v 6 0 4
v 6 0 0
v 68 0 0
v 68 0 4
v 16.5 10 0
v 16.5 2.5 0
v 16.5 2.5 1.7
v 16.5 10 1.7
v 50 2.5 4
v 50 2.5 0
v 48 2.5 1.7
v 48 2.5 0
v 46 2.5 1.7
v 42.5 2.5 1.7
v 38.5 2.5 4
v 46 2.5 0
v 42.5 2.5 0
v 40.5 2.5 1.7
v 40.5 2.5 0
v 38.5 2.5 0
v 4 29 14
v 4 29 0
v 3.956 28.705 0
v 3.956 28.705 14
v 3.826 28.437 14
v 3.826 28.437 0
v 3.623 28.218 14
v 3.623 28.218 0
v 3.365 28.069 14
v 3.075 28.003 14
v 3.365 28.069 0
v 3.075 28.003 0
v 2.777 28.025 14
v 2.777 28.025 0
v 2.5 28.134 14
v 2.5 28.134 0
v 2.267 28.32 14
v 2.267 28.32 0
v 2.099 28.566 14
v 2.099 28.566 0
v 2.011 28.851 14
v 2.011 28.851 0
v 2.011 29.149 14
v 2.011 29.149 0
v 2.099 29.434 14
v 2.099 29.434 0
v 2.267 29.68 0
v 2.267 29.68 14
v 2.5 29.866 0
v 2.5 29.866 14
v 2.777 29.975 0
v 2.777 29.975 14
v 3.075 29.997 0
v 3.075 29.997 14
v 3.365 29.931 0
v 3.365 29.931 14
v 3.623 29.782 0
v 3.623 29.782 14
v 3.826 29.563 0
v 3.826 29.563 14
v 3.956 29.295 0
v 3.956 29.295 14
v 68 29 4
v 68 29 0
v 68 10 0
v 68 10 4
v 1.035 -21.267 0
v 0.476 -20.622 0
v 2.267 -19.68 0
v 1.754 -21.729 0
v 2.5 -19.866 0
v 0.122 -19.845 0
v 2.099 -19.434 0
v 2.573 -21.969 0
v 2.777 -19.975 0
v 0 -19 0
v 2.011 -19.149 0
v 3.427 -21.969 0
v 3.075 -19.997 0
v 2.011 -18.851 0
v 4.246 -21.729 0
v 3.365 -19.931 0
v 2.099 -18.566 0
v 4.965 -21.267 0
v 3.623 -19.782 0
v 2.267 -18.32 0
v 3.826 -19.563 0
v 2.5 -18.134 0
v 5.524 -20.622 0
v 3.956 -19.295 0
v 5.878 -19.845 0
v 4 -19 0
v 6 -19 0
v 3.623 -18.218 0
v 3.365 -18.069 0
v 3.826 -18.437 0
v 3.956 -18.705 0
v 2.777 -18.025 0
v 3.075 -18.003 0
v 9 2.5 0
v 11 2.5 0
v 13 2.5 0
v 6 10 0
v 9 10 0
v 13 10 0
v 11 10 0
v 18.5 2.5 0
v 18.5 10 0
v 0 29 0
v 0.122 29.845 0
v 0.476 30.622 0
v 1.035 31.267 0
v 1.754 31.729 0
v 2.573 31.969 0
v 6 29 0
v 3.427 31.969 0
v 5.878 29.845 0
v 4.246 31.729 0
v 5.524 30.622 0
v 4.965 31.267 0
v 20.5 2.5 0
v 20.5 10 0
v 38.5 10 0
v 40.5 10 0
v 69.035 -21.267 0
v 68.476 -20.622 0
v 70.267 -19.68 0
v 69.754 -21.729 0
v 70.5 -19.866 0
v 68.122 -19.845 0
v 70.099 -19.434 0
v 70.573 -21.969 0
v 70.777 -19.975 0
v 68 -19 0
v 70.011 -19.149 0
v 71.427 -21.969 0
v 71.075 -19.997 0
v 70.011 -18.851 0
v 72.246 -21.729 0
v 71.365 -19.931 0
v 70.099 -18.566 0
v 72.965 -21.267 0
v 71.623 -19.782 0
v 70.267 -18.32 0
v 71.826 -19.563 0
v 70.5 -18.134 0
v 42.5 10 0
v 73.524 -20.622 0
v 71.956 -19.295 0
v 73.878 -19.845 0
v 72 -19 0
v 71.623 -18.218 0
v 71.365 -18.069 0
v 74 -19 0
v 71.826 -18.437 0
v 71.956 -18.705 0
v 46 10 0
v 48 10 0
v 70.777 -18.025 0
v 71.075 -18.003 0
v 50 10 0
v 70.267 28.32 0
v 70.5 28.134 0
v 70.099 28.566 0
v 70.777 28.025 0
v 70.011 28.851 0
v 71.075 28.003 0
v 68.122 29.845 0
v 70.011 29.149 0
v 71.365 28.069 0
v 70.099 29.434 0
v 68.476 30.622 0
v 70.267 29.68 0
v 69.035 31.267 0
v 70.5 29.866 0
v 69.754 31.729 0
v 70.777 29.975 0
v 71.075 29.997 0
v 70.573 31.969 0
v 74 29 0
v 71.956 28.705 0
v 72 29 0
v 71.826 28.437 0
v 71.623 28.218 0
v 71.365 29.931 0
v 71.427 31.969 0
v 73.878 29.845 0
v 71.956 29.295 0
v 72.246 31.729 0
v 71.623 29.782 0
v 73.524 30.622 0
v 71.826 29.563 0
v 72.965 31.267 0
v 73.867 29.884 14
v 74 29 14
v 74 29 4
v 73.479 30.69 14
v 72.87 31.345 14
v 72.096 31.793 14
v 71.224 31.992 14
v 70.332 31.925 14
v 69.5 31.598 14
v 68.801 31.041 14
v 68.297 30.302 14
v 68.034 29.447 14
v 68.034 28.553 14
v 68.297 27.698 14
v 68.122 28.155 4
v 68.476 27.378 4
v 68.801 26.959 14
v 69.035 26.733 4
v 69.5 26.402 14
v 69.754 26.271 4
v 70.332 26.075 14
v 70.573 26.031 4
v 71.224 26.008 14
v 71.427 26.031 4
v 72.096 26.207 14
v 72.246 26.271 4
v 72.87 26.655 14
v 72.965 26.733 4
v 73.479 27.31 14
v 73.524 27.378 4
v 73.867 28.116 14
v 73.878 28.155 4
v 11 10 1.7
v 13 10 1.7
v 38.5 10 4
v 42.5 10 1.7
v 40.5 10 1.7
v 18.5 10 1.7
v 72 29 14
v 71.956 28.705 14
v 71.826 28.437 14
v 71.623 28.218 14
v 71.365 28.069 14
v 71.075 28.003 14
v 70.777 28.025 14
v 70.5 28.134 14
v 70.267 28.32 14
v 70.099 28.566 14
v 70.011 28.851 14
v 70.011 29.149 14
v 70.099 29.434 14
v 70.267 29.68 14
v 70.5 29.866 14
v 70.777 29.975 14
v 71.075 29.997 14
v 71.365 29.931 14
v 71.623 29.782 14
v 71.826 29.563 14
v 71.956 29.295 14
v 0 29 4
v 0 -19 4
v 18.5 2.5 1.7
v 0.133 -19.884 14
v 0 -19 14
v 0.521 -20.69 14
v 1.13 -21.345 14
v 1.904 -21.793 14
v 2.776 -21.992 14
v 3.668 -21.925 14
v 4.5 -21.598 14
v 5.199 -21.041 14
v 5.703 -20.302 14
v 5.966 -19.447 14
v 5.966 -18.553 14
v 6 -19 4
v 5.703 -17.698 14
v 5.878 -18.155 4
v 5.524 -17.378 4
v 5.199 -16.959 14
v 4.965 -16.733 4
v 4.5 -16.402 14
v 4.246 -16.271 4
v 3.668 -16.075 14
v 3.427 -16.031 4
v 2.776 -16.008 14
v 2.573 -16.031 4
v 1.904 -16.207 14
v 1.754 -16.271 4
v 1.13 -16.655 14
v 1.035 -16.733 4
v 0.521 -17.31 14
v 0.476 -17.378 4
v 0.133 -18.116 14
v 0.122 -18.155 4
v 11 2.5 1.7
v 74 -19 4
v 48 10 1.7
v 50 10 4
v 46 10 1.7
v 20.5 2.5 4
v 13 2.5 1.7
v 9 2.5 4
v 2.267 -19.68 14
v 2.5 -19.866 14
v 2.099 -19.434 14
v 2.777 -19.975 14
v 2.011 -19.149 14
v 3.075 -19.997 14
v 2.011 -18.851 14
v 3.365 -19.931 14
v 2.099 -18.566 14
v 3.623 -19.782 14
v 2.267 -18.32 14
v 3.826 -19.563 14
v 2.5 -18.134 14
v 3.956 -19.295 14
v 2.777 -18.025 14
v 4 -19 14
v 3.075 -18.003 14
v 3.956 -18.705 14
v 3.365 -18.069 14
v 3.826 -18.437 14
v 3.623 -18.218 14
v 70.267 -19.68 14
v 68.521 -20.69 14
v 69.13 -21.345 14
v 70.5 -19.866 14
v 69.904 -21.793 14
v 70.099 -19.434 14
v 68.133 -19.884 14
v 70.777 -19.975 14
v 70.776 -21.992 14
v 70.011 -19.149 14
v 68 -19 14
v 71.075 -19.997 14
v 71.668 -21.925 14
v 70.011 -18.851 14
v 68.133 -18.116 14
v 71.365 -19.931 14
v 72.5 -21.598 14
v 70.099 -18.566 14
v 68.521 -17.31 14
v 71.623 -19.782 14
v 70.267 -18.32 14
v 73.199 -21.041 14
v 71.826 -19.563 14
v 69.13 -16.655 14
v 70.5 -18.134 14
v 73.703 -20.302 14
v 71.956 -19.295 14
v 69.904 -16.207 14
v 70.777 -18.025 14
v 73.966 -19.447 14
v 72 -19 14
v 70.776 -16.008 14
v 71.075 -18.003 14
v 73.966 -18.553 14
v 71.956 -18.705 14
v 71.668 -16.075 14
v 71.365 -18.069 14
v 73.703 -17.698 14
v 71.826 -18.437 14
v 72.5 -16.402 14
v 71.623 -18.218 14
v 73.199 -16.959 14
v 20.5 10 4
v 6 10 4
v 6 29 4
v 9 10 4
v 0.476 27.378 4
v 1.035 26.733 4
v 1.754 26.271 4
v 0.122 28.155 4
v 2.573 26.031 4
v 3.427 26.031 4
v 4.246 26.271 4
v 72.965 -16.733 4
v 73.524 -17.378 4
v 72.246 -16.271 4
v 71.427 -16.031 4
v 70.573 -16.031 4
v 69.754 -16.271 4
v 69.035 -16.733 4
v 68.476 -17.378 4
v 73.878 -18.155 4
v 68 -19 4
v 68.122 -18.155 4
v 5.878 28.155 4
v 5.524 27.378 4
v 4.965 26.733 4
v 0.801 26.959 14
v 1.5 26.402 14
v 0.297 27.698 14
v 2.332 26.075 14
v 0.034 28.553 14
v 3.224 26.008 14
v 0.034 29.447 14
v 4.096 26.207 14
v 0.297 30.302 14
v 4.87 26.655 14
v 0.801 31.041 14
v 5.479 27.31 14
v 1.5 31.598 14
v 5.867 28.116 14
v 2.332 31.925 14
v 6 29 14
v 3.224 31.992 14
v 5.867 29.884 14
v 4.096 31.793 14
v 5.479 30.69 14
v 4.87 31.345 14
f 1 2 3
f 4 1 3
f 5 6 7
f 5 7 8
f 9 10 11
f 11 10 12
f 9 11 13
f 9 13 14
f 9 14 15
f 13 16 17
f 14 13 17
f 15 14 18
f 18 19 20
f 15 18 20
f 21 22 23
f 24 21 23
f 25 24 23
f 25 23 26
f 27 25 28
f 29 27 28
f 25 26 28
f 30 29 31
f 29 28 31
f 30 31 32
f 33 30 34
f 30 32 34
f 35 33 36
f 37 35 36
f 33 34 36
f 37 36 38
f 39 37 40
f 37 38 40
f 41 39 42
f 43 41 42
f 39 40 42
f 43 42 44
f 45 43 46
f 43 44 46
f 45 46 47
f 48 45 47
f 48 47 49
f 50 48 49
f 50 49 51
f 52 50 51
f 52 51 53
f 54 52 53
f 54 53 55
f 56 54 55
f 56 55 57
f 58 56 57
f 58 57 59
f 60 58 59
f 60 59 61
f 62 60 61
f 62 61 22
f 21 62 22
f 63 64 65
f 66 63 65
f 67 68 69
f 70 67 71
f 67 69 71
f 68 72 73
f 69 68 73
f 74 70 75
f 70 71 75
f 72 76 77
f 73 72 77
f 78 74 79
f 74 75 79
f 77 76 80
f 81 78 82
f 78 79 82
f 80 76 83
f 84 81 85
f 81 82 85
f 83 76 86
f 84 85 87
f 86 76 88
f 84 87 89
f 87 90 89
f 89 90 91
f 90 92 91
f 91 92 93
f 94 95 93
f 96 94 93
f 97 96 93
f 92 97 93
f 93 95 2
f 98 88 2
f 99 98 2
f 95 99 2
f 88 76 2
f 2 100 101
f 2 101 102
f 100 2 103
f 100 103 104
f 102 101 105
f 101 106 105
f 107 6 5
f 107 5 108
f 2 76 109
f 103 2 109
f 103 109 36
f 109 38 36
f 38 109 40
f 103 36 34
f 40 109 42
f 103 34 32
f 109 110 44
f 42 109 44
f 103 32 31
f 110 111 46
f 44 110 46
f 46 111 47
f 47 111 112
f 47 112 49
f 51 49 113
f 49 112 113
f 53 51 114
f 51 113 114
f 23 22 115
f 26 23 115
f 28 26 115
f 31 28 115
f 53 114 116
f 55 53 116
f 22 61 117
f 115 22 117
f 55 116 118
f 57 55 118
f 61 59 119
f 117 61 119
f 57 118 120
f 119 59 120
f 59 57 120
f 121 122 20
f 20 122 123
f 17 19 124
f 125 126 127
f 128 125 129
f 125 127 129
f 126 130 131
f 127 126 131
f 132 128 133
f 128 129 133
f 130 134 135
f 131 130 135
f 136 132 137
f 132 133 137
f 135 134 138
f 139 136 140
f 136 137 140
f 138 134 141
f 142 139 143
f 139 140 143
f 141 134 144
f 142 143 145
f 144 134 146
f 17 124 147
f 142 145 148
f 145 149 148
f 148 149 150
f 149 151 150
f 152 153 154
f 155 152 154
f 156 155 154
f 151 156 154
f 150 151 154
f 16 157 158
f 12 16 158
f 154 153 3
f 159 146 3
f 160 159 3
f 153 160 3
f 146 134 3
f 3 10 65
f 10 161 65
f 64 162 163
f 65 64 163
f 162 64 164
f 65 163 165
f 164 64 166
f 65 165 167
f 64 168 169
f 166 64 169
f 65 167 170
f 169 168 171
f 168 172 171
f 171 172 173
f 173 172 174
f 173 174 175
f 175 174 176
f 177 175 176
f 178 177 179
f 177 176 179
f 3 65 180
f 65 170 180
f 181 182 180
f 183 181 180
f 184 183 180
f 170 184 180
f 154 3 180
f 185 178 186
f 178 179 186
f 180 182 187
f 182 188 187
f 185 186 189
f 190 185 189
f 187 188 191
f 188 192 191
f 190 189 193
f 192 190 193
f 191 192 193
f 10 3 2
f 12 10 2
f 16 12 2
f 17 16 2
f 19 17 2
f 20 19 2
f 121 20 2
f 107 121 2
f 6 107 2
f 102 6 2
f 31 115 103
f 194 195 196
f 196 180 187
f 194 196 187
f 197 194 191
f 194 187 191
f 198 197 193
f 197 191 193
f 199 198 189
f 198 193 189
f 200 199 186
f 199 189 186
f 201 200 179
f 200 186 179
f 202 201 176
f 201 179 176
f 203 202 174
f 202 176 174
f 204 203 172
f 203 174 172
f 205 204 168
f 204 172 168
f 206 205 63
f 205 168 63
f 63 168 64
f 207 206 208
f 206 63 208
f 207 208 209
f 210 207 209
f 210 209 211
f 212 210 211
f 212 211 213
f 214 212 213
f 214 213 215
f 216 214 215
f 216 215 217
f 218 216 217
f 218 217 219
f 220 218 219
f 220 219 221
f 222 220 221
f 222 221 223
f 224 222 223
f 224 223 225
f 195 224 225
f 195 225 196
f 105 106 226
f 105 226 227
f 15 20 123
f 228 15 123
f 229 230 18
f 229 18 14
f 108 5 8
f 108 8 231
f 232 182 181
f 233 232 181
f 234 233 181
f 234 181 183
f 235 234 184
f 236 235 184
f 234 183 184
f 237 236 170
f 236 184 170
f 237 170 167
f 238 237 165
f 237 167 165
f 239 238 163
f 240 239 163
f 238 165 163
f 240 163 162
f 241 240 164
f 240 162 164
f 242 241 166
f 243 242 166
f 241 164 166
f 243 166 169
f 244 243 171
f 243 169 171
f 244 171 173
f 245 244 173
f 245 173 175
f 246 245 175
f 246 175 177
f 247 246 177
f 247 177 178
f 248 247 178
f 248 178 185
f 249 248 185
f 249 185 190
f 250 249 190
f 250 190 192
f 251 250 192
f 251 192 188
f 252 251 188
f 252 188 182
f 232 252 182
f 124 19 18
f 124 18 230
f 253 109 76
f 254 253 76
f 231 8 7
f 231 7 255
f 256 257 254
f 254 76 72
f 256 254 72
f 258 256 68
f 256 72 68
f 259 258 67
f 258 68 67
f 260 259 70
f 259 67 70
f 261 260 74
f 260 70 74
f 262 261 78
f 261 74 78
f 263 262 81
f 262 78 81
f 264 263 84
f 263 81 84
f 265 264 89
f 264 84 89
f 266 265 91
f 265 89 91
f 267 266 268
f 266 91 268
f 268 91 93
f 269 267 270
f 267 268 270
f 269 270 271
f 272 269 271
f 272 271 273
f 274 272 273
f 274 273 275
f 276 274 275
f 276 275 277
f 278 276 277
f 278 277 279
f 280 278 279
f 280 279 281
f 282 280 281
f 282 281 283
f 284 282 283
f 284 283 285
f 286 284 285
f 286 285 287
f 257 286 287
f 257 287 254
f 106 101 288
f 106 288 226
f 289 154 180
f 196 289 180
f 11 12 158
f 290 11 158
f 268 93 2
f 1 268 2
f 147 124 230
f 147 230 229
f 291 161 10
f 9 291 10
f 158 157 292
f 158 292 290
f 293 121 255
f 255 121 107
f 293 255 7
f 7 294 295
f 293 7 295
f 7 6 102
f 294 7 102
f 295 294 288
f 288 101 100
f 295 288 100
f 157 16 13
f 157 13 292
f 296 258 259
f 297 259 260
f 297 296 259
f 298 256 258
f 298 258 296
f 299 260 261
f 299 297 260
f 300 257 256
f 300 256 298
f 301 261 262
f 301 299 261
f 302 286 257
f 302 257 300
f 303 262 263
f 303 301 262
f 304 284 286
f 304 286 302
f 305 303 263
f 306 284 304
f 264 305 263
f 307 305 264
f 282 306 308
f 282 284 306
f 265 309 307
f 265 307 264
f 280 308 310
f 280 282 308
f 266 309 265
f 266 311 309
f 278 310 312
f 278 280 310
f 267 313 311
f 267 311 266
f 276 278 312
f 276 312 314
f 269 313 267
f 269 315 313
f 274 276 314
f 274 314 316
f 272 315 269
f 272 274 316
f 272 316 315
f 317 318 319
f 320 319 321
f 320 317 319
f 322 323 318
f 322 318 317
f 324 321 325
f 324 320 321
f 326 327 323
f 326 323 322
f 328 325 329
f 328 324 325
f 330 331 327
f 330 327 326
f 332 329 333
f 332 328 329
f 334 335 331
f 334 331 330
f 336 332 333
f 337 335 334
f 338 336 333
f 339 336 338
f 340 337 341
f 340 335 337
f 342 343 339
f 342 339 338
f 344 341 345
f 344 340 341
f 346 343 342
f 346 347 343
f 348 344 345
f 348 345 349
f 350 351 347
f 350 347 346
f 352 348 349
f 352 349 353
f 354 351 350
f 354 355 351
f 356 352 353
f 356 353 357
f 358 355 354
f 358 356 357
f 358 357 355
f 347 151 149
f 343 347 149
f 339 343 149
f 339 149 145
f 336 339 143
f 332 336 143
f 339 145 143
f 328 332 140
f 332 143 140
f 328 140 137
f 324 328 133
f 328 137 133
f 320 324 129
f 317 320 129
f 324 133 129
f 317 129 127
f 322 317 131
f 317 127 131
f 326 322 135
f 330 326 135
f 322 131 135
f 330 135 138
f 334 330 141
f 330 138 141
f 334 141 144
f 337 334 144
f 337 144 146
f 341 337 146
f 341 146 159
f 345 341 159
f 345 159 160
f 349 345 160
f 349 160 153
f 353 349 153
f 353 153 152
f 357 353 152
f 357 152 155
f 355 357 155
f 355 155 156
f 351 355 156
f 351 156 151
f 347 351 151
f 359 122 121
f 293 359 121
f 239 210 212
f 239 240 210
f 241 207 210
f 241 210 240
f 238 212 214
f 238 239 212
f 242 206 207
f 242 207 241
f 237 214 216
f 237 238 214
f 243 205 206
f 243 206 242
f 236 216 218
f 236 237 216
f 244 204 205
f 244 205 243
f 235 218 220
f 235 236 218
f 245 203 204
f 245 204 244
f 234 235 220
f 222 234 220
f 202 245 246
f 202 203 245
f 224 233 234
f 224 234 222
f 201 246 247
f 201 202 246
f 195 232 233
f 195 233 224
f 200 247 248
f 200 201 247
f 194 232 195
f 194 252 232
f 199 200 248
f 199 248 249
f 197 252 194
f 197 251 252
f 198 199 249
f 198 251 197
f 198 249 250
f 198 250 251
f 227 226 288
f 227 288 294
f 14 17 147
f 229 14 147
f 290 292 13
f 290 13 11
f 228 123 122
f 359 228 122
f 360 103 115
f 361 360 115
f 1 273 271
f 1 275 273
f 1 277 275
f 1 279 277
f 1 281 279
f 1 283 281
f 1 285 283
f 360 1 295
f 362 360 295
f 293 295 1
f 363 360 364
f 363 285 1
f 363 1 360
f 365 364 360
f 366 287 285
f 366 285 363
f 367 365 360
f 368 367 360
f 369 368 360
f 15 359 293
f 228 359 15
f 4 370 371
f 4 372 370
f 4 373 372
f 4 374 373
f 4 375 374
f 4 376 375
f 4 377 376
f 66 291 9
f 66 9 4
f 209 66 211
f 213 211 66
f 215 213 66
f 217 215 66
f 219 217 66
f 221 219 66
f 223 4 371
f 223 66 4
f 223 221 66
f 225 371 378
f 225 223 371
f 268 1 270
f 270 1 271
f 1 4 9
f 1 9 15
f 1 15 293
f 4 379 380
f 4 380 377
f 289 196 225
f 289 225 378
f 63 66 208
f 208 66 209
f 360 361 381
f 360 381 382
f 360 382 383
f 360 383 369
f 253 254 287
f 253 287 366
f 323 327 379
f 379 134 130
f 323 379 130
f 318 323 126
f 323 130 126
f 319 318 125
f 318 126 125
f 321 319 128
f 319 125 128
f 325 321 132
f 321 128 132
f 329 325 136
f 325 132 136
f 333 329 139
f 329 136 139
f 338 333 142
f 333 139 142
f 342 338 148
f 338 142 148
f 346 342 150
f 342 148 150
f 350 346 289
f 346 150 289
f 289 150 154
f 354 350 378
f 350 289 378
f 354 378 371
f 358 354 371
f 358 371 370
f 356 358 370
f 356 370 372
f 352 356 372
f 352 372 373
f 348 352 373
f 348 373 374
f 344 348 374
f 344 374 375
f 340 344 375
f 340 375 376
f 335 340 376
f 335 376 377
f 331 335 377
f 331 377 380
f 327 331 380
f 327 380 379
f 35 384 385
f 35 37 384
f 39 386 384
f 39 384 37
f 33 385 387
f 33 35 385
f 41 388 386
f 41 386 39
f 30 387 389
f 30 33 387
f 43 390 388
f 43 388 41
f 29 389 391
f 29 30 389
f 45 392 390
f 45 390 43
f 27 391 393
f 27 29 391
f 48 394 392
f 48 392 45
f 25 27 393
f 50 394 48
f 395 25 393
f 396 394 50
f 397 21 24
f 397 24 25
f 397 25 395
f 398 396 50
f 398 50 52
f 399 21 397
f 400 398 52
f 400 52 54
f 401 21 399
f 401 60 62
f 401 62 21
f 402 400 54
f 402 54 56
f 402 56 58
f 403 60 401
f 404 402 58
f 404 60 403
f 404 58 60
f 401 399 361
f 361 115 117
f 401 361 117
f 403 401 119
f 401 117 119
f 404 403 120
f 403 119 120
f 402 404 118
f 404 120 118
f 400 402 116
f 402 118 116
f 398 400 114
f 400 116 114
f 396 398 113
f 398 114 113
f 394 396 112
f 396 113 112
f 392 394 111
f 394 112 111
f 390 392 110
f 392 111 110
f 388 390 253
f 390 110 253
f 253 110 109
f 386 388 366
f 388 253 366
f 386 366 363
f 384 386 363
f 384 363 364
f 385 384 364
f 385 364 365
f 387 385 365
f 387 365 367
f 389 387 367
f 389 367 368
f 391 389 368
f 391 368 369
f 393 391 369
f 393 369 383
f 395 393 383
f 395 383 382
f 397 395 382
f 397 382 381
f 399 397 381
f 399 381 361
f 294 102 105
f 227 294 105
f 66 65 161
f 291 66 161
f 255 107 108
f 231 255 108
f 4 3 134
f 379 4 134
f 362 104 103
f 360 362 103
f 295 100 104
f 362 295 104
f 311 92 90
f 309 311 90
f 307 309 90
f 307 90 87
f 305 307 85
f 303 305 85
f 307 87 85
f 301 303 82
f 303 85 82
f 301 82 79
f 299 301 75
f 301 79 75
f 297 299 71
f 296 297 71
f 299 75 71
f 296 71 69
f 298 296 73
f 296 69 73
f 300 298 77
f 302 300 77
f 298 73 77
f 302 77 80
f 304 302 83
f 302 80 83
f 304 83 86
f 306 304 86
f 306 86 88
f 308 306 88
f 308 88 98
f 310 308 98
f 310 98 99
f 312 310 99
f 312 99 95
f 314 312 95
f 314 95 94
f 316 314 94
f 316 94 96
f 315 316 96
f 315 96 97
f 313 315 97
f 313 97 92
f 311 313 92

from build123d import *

# Parameters (mm, degrees)
F1_DEPTH = 4
F2_W     = 2
F2_H     = 7.5
F3_DEPTH = 1.7
F5_DEPTH = 10
F6_R     = 1
F7_DEPTH = 25


with BuildPart() as f1:
    # F0 (on Top) → F1 (new body)
    with BuildSketch(Plane.XY):
        with BuildLine():
            Line((6, 0), (68, 0))
            Line((68, 0), (68, -19))
            ThreePointArc((68, -19), (71, -22), (74, -19))
            Line((74, -19), (74, 29))
            ThreePointArc((74, 29), (71, 32), (68, 29))
            Line((68, 29), (68, 10))
            Line((68, 10), (50, 10))
            Line((50, 10), (50, 2.5))
            Line((50, 2.5), (38.5, 2.5))
            Line((38.5, 2.5), (38.5, 10))
            Line((38.5, 10), (20.5, 10))
            Line((20.5, 10), (20.5, 2.5))
            Line((20.5, 2.5), (9, 2.5))
            Line((9, 2.5), (9, 10))
            Line((9, 10), (6, 10))
            Line((6, 10), (6, 29))
            ThreePointArc((6, 29), (3, 32), (0, 29))
            Line((0, 29), (0, -19))
            ThreePointArc((0, -19), (3, -22), (6, -19))
            Line((6, -19), (6, 0))
        make_face()
    extrude(amount=F1_DEPTH)

    # F2 (on Top) → F3 (join)
    with BuildSketch(Plane.XY):
        with Locations((12, 6.25)):
            Rectangle(F2_W, F2_H)
        with Locations((17.5, 6.25)):
            Rectangle(F2_W, F2_H)
        with Locations((41.5, 6.25)):
            Rectangle(F2_W, F2_H)
        with Locations((47, 6.25)):
            Rectangle(F2_W, F2_H)
    extrude(amount=F3_DEPTH)

    # F4 (on face) → F5 (join)
    with BuildSketch(Plane.XY.offset(4)):
        with BuildLine():
            ThreePointArc((0, 29), (3, 26), (6, 29))
            ThreePointArc((6, 29), (3, 32), (0, 29))
        make_face()
        with BuildLine():
            ThreePointArc((6, -19), (3, -16), (0, -19))
            ThreePointArc((0, -19), (3, -22), (6, -19))
        make_face()
        with BuildLine():
            ThreePointArc((74, -19), (71, -16), (68, -19))
            ThreePointArc((68, -19), (71, -22), (74, -19))
        make_face()
        with BuildLine():
            ThreePointArc((68, 29), (71, 26), (74, 29))
            ThreePointArc((74, 29), (71, 32), (68, 29))
        make_face()
    extrude(amount=F5_DEPTH)

    # F6 (on face) → F7 (cut)
    with BuildSketch(Plane(origin=(0, 0, 0), x_dir=(1, 0, 0), z_dir=(0, 0, -1))):
        with Locations((3, 19)):
            Circle(F6_R)
        with Locations((71, 19)):
            Circle(F6_R)
        with Locations((71, -29)):
            Circle(F6_R)
        with Locations((3, -29)):
            Circle(F6_R)
    extrude(amount=-F7_DEPTH, mode=Mode.SUBTRACT)


solid = f1.part
